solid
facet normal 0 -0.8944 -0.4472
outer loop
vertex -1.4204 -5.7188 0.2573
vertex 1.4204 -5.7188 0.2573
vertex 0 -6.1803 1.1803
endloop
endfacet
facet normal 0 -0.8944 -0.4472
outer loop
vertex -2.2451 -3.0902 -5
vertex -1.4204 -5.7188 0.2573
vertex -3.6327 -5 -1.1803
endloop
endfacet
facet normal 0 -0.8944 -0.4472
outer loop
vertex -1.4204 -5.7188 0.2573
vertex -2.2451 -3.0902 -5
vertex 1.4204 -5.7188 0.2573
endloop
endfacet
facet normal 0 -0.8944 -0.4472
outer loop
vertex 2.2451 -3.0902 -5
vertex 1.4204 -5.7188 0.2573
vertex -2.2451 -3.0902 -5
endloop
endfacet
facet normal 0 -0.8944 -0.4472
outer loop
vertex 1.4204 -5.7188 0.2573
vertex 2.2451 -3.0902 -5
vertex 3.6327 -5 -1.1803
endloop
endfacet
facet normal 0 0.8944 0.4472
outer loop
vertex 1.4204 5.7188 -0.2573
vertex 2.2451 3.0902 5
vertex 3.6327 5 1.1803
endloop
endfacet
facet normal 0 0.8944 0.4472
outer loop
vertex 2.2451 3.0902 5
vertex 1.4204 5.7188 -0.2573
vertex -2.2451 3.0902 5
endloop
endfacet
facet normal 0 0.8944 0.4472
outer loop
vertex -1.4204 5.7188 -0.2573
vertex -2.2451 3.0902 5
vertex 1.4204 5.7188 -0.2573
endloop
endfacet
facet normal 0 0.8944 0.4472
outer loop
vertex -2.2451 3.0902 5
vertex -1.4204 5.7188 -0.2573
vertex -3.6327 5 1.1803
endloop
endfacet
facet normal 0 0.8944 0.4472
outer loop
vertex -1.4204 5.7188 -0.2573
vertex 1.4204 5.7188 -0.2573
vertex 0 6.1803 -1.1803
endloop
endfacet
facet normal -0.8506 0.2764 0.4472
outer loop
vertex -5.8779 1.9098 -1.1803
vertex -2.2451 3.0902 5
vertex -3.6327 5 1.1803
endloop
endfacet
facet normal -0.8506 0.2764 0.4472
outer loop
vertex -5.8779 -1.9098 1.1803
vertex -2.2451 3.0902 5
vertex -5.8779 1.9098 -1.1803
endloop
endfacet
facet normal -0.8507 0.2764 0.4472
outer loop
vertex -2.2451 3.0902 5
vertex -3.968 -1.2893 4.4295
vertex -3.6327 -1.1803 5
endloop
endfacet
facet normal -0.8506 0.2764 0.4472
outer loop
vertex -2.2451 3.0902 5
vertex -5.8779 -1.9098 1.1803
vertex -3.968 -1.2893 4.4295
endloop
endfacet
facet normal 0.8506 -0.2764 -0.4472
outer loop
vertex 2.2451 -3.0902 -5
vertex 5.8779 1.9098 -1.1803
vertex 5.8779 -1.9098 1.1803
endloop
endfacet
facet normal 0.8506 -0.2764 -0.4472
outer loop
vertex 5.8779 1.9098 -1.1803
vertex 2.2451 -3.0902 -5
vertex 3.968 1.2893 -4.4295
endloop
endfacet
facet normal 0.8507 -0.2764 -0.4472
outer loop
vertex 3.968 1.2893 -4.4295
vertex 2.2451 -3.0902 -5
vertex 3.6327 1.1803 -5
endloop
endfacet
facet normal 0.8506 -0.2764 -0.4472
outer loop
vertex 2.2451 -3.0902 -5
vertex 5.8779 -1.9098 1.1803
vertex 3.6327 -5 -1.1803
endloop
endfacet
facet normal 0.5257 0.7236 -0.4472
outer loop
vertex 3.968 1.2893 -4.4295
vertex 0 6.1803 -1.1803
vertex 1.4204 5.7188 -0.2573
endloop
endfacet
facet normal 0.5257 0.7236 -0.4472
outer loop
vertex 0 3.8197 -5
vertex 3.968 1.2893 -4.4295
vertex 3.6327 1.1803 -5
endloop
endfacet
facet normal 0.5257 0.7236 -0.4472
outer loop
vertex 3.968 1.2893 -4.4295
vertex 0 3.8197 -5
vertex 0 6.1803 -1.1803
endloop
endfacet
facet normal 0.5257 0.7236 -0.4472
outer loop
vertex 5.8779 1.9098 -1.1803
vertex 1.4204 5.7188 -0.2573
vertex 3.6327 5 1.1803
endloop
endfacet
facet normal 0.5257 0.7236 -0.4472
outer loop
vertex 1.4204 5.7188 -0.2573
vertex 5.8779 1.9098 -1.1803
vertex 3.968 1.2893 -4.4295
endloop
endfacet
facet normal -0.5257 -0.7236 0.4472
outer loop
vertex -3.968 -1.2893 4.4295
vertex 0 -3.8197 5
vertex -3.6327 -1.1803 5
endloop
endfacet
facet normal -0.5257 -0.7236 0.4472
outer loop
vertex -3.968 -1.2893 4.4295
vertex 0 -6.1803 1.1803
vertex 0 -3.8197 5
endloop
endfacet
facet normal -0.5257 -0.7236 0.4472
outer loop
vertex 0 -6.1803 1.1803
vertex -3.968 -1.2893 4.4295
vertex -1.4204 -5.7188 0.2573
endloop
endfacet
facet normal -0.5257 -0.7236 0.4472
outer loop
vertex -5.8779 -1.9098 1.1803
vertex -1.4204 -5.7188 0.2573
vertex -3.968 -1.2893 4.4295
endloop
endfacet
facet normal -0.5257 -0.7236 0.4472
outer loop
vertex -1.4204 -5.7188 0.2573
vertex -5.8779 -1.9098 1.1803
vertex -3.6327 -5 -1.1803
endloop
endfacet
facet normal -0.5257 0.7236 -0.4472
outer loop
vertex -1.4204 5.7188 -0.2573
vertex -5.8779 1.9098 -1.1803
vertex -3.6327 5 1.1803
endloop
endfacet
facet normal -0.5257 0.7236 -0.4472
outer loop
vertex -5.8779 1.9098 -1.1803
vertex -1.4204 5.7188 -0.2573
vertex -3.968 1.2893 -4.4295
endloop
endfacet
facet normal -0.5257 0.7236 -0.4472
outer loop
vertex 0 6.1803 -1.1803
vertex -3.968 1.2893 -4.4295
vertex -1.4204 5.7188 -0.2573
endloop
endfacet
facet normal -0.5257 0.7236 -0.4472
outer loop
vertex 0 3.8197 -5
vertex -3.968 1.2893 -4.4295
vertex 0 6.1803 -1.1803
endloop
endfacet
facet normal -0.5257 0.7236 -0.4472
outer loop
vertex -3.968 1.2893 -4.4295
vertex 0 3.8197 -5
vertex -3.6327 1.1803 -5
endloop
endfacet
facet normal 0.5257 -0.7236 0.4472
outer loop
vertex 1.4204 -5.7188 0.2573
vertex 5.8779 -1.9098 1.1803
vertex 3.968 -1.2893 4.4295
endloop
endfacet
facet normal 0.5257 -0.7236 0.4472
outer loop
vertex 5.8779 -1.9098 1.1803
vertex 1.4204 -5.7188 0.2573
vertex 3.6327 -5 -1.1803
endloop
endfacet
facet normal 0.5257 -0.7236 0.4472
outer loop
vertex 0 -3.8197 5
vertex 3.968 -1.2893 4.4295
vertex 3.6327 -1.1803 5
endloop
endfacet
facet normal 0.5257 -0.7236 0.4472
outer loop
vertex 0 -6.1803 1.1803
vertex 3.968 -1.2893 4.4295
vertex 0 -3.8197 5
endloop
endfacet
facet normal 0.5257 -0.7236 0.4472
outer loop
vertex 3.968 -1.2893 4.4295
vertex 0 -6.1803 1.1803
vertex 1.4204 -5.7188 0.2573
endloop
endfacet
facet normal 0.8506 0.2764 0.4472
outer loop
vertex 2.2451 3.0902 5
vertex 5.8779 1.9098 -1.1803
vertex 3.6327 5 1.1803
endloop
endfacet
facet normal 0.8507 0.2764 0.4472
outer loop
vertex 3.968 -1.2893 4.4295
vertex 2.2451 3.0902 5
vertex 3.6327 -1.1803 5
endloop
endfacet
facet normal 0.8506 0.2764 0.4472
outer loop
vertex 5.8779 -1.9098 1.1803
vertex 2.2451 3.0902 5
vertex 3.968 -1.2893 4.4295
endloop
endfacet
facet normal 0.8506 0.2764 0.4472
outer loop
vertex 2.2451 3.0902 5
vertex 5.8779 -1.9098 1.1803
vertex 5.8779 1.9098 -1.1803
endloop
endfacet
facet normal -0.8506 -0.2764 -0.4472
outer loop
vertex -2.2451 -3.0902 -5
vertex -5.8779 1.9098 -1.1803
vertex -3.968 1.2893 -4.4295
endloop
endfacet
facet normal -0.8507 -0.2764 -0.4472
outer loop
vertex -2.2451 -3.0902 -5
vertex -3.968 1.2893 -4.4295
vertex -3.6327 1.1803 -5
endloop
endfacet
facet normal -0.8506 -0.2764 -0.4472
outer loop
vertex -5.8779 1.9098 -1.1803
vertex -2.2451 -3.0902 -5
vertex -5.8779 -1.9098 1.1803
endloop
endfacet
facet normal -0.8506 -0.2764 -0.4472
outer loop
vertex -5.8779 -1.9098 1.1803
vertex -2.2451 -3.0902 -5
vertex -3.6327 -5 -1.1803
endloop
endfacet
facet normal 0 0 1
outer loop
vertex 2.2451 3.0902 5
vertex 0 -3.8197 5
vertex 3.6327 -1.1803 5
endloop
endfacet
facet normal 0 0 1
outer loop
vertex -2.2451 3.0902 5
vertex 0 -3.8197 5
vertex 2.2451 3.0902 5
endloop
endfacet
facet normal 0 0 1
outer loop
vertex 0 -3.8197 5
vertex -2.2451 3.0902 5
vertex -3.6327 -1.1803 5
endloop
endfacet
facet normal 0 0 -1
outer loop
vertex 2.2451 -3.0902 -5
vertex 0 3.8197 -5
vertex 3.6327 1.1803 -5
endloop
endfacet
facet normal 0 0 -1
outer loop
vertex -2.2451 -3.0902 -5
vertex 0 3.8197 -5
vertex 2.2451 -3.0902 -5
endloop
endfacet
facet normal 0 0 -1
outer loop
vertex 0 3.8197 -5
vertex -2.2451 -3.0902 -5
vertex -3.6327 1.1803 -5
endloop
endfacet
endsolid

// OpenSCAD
// 12面体骰子
module item(w=10,d=45,p=0){
    rotate([d,0,p])
        cube([w*2,w,w*2],center=true);
}

module dice_12(w=10){
    d=90-acos(tan(18)/tan(36));
    intersection(){
        item(w,90,0);
        intersection_for (a = [ 0 : 4 ])item(w,d,72*a);
    };
}

w=10;
dice_12(w);
